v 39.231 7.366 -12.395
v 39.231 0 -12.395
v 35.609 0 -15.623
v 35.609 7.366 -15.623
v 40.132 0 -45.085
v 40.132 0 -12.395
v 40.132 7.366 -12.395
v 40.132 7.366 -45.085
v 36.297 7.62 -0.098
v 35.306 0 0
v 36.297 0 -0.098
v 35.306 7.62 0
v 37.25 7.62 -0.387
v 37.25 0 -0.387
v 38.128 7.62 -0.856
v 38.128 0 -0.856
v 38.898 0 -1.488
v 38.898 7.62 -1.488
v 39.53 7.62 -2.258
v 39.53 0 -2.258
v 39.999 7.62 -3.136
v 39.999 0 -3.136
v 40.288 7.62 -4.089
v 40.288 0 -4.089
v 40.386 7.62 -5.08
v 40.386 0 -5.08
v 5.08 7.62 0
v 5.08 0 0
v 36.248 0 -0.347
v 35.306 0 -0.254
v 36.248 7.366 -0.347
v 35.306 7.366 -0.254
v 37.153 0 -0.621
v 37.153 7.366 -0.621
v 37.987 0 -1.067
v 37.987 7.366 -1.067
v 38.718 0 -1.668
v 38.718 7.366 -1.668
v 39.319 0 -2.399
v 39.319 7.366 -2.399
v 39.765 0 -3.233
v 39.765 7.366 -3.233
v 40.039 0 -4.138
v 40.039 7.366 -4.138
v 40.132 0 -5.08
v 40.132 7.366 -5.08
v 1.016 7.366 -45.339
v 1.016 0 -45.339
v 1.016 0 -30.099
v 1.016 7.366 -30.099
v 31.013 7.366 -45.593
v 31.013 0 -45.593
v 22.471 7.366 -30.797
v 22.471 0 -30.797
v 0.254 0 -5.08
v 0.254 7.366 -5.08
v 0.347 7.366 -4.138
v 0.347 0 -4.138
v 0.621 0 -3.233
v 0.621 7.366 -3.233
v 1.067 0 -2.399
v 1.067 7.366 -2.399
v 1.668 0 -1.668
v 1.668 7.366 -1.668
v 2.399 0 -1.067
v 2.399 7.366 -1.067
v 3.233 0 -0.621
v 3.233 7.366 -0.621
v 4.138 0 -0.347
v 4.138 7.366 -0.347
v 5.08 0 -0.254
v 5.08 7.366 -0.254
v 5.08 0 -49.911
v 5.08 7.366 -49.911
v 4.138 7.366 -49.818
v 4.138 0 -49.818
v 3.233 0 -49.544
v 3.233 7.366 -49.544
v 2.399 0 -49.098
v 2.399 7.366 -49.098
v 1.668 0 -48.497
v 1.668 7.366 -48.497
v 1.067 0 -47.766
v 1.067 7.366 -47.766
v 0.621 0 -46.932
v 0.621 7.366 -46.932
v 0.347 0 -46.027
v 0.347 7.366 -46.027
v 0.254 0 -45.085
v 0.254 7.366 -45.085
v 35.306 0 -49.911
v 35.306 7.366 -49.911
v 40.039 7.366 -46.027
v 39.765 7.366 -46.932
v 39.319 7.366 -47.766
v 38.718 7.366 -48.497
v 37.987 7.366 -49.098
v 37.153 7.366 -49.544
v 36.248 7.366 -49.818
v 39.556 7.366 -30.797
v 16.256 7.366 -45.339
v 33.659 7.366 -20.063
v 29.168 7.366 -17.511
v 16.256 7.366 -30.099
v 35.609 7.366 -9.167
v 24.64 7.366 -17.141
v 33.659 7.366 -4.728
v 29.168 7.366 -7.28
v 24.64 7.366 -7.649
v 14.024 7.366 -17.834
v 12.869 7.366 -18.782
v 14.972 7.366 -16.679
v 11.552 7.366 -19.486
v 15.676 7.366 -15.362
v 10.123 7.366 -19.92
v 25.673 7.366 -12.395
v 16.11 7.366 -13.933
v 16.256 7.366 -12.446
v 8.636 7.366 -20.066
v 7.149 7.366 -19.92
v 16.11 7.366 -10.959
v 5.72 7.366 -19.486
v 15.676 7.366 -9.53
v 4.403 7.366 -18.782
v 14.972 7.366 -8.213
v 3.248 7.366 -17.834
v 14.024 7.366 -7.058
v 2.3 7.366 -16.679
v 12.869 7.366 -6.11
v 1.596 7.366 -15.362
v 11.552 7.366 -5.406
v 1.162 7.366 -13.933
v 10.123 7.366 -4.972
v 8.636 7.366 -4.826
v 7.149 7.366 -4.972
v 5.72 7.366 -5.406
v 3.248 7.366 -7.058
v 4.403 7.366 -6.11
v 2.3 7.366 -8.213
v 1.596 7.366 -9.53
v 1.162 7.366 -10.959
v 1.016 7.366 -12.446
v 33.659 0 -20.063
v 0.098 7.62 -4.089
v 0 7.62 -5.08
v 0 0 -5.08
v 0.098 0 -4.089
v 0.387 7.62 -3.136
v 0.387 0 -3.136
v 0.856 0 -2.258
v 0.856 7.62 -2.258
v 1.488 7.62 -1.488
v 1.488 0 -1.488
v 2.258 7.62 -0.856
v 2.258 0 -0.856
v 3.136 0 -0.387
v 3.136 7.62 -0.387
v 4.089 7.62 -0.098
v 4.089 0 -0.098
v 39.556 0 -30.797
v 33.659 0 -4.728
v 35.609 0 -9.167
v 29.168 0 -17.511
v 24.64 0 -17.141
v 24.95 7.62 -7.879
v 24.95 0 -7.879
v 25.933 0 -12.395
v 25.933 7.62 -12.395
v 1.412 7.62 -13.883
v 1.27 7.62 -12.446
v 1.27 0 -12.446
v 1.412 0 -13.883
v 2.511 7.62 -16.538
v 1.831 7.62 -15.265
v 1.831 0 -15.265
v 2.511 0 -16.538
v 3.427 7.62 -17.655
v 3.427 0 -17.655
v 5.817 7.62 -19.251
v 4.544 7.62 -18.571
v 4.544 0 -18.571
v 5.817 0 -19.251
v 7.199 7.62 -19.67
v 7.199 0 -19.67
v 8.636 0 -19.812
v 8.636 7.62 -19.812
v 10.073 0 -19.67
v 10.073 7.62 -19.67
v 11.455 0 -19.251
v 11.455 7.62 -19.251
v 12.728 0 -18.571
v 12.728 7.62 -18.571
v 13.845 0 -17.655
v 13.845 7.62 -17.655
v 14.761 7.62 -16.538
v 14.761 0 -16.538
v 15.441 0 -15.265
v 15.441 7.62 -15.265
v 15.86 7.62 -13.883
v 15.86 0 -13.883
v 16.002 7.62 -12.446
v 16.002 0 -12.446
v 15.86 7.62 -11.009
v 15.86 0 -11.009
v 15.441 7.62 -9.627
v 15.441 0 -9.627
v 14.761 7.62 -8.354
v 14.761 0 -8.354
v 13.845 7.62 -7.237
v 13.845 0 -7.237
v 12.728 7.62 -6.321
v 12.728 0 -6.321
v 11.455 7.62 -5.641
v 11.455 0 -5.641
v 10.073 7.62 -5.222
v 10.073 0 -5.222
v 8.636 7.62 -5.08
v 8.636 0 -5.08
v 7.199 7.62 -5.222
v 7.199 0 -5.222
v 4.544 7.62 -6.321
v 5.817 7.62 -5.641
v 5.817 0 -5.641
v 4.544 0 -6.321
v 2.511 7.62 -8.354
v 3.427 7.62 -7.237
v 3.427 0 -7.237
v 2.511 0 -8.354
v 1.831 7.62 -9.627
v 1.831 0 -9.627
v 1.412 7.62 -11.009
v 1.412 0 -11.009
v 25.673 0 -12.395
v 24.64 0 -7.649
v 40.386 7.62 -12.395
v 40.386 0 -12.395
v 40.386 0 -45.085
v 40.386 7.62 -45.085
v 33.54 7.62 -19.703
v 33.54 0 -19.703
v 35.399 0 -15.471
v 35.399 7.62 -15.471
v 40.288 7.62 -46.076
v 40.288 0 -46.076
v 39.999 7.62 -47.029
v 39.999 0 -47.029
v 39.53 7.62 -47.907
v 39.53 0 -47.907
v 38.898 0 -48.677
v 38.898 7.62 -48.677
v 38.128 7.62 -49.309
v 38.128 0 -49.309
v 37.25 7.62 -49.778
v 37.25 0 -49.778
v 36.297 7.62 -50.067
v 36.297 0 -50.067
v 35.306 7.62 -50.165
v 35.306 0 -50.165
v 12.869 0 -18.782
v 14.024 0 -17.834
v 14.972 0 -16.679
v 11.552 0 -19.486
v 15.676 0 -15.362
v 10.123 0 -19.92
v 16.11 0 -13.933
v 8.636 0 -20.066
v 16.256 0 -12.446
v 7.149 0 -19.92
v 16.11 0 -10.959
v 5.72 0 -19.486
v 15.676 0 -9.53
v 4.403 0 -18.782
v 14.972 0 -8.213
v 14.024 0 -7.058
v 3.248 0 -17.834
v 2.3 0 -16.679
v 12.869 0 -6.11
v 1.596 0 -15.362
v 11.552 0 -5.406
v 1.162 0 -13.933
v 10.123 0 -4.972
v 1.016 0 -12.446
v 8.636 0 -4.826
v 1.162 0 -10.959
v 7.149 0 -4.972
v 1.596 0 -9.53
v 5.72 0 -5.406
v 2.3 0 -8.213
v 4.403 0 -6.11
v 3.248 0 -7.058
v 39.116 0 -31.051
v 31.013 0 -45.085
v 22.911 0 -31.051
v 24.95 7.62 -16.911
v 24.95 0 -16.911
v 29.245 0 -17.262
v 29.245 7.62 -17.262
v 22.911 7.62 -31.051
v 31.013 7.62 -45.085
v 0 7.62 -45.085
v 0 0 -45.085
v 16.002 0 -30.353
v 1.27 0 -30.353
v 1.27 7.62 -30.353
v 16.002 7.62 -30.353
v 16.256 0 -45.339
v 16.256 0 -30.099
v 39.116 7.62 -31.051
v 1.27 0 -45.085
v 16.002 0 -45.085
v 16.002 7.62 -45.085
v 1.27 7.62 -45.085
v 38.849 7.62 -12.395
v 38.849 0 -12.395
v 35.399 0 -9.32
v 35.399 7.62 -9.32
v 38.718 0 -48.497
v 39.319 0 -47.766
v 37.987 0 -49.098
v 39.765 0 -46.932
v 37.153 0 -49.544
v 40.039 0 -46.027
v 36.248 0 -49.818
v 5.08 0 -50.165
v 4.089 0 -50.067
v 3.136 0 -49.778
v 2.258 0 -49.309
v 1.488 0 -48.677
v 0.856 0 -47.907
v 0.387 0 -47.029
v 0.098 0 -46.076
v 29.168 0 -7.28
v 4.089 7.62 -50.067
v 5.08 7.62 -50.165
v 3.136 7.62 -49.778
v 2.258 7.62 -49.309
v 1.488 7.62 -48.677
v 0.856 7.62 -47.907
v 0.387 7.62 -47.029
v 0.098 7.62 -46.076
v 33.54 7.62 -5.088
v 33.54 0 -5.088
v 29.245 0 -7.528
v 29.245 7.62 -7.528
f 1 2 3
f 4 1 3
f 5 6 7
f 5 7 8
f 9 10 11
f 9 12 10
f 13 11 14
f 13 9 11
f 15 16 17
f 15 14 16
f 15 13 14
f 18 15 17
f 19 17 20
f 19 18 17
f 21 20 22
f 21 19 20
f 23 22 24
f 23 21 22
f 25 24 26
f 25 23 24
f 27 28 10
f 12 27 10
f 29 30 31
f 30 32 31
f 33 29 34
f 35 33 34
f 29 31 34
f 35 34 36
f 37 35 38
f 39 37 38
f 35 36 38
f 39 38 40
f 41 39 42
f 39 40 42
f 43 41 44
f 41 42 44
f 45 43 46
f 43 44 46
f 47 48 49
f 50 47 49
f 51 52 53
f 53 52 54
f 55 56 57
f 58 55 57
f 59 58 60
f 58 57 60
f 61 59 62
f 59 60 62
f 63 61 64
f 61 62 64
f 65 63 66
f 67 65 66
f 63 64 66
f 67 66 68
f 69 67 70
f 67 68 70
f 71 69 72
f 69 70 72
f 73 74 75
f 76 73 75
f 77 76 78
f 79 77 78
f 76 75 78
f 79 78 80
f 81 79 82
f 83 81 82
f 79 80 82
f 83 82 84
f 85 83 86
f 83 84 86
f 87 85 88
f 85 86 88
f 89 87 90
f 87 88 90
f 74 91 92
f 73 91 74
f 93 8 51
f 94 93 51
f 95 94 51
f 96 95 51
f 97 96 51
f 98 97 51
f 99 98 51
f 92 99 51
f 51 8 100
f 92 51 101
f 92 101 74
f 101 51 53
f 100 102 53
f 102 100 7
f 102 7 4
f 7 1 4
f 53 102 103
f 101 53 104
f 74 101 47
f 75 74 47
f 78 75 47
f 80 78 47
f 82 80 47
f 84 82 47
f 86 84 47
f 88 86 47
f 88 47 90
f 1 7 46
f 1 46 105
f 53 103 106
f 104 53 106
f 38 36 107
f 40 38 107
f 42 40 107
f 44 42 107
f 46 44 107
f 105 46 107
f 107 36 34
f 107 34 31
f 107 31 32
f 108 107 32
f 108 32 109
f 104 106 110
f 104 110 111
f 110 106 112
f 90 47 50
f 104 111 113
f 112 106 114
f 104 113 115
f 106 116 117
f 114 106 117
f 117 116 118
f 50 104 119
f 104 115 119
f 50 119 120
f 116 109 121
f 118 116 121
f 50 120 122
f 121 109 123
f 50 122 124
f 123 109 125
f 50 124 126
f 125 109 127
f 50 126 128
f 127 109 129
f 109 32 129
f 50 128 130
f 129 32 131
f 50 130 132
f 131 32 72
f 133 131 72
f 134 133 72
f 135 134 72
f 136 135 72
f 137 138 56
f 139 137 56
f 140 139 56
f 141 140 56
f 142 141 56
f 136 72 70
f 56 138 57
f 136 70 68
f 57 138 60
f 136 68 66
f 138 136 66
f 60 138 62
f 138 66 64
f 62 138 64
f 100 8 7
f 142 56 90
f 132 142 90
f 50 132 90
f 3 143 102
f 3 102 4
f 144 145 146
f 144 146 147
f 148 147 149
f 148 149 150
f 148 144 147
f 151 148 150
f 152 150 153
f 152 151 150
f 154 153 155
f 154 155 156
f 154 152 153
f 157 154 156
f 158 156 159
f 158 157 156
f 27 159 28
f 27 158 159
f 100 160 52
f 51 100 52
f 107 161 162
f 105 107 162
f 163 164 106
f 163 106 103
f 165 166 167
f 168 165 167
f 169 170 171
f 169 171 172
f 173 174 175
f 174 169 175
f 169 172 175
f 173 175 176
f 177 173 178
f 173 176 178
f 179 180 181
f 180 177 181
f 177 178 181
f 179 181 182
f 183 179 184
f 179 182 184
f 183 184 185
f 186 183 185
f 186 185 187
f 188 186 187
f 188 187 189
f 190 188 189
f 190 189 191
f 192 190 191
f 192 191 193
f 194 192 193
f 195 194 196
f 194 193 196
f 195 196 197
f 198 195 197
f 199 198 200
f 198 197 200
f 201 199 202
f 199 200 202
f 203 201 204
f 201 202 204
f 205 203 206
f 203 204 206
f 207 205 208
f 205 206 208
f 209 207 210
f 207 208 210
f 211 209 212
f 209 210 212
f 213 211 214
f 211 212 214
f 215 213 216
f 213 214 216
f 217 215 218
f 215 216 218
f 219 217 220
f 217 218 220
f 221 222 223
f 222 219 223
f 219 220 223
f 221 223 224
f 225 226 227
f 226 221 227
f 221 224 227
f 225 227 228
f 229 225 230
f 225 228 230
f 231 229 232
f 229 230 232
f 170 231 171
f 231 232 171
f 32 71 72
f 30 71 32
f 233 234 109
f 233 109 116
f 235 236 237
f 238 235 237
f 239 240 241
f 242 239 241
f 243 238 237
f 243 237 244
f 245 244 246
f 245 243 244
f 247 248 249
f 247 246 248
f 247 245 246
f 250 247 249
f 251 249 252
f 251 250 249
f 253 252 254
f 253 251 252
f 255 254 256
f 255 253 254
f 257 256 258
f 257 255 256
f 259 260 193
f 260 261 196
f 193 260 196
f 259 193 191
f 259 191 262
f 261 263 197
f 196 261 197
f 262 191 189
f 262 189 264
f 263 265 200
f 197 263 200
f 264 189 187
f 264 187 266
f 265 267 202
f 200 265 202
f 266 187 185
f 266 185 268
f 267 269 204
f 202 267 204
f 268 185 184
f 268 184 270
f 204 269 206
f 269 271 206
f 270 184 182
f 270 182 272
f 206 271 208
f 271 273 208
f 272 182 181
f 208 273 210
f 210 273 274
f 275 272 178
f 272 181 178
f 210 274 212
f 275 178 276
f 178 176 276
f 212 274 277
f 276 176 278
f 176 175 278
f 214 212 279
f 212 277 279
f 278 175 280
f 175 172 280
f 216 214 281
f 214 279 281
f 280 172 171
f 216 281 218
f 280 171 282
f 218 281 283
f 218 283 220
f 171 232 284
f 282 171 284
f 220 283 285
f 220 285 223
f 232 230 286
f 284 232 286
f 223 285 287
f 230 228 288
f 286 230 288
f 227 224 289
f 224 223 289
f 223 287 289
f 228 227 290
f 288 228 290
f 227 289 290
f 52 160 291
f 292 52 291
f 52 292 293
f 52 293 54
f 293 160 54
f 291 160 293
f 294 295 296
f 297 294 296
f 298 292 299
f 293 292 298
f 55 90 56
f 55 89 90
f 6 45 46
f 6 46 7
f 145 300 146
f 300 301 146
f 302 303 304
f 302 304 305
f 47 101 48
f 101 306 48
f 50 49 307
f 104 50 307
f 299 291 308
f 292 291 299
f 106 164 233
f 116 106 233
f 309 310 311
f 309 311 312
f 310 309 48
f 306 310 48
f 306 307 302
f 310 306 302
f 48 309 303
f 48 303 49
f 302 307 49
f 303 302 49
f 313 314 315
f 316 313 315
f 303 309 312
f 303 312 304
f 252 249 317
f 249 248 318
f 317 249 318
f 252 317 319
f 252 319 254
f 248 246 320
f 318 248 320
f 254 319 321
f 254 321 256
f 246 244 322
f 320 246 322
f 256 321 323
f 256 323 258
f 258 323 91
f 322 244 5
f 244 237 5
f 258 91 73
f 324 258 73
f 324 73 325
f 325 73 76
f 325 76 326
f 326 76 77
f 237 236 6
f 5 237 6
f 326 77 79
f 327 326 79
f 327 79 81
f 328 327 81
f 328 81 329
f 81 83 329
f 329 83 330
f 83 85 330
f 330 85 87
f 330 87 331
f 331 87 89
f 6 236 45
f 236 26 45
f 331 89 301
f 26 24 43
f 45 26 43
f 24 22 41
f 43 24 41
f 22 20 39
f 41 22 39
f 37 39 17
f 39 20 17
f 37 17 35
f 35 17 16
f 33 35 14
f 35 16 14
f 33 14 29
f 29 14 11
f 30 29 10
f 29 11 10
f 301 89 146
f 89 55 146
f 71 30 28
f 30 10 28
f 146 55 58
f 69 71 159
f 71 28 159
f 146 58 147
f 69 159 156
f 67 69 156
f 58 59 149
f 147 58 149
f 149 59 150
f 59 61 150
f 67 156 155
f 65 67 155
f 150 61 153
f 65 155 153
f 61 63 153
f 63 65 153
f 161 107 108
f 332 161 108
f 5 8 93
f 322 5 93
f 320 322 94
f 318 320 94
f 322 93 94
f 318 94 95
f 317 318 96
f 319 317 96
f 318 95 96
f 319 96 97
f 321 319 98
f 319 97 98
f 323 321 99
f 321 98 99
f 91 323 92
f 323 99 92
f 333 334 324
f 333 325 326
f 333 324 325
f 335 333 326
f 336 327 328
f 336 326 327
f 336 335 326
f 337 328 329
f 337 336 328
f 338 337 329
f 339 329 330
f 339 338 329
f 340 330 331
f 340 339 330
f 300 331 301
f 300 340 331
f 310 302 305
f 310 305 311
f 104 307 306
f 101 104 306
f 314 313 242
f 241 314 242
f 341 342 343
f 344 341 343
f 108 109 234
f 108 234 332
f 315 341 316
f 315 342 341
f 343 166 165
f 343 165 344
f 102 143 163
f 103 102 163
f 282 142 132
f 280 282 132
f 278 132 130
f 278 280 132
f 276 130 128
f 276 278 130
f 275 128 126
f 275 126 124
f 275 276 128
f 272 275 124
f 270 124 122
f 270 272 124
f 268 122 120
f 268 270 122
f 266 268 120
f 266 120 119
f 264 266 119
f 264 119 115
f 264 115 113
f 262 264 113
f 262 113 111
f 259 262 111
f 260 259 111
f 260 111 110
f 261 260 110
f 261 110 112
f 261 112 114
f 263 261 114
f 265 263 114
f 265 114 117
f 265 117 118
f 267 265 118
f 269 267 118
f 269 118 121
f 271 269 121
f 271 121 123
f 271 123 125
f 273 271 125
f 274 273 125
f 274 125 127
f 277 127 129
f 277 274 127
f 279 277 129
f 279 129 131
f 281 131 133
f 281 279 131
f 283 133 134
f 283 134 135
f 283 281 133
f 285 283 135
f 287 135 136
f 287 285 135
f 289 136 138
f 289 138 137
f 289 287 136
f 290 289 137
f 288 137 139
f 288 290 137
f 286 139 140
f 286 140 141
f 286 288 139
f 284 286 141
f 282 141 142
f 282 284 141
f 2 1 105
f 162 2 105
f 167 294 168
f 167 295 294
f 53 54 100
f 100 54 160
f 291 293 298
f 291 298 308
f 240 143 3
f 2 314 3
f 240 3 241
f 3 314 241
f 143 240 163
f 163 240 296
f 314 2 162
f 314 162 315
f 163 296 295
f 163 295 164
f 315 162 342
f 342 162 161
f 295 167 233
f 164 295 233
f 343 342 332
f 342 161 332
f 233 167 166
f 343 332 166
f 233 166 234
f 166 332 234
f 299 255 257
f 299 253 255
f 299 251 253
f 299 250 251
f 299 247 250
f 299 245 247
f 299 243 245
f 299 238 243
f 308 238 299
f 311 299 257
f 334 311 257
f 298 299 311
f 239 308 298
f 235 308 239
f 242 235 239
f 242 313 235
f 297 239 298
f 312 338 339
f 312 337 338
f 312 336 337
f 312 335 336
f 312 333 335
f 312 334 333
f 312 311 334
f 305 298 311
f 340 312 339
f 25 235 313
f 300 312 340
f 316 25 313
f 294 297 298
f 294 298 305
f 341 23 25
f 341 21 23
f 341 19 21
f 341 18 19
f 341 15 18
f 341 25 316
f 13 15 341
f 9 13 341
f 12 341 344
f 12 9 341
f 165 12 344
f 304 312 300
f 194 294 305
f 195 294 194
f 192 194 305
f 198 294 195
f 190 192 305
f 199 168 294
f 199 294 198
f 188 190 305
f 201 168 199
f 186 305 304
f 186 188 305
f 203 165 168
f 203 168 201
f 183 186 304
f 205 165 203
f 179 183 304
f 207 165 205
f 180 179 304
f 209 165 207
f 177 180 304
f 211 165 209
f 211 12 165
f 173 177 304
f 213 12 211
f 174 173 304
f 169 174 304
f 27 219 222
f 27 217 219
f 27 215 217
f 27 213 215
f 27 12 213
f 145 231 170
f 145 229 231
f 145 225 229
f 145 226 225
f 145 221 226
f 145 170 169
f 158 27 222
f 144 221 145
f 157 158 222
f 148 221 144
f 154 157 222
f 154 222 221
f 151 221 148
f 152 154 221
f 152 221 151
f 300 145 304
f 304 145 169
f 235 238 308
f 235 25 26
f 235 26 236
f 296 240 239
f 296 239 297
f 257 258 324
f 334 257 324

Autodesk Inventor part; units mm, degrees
ref_plane "YZ Plane" through (0, 0, 0) normal (1, 0, 0) x (0, 1, 0)
ref_plane "XZ Plane" through (0, 0, 0) normal (0, 1, 0) x (-1, 0, 0)
ref_plane "XY Plane" through (0, 0, 0) normal (0, 0, 1) x (1, 0, 0)
sketch "Sketch1" plane through (0, 0, 0) normal (0, 1, 0) x (-1, 0, 0)
  line L0 (0, 0) -> (-40.386, 0)
  line L1 (-40.386, 0) -> (-40.386, -50.165)
  line L2 (-40.386, -50.165) -> (0, -50.165)
  circle A0 centre (-8.636, -12.446) radius 7.366
  line L3 (-1.27, -45.085) -> (-1.27, -30.353)
  line L4 (-1.27, -30.353) -> (-16.002, -30.353)
  line L5 (-16.002, -30.353) -> (-16.002, -45.085)
  line L6 (-16.002, -45.085) -> (-1.27, -45.085)
  line L7 (-31.0134, -45.085) -> (-22.9108, -31.0509)
  line L8 (-22.9108, -31.0509) -> (-39.116, -31.0509)
  line L9 (-39.116, -31.0509) -> (-31.0134, -45.085)
  line L10 (-40.386, 0) -> (-40.386, -12.3952)
  line L11 (-38.8493, -12.3952) -> (-35.3989, -15.4707)
  line L12 (-33.5401, -19.7026) -> (-35.3989, -15.4707)
  line L13 (-24.9497, -7.879) -> (-25.9334, -12.3952)
  line L14 (-24.9497, -16.9114) -> (-25.9334, -12.3952)
  line L15 (-24.9497, -16.9114) -> (-29.2449, -17.2623)
  line L16 (-33.5401, -19.7026) -> (-29.2449, -17.2623)
  line L17 (-33.5401, -5.0878) -> (-29.2449, -7.5281)
  line L18 (-24.9497, -7.879) -> (-29.2449, -7.5281)
  line L19 (-38.8493, -12.3952) -> (-35.3989, -9.3197)
  line L20 (-33.5401, -5.0878) -> (-35.3989, -9.3197)
  line L21 (0, -50.165) -> (0, 0)
  point P0 (-31.1658, -12.3952)
  dimension "d0" = 40.386
  dimension "d1" = 50.165
  dimension "d4" = 14.732
  dimension "d7" = 14.732
  dimension "d8" = 14.732
  dimension "d15" = 12.3952
extrude "Extrusion1" add sketch "Sketch1" along normal blind 7.62
fillet "Fillet1" radius 5.08 4 edges at (40.386, 3.81, 0) (40.386, 3.81, -50.165) (0, 3.81, -50.165) (0, 3.81, 0)
shell "Shell1" thickness 0.254 removed faces 1 at (23.3087, 0, -40.407)
properties part number "PassengerBaseGBR"
